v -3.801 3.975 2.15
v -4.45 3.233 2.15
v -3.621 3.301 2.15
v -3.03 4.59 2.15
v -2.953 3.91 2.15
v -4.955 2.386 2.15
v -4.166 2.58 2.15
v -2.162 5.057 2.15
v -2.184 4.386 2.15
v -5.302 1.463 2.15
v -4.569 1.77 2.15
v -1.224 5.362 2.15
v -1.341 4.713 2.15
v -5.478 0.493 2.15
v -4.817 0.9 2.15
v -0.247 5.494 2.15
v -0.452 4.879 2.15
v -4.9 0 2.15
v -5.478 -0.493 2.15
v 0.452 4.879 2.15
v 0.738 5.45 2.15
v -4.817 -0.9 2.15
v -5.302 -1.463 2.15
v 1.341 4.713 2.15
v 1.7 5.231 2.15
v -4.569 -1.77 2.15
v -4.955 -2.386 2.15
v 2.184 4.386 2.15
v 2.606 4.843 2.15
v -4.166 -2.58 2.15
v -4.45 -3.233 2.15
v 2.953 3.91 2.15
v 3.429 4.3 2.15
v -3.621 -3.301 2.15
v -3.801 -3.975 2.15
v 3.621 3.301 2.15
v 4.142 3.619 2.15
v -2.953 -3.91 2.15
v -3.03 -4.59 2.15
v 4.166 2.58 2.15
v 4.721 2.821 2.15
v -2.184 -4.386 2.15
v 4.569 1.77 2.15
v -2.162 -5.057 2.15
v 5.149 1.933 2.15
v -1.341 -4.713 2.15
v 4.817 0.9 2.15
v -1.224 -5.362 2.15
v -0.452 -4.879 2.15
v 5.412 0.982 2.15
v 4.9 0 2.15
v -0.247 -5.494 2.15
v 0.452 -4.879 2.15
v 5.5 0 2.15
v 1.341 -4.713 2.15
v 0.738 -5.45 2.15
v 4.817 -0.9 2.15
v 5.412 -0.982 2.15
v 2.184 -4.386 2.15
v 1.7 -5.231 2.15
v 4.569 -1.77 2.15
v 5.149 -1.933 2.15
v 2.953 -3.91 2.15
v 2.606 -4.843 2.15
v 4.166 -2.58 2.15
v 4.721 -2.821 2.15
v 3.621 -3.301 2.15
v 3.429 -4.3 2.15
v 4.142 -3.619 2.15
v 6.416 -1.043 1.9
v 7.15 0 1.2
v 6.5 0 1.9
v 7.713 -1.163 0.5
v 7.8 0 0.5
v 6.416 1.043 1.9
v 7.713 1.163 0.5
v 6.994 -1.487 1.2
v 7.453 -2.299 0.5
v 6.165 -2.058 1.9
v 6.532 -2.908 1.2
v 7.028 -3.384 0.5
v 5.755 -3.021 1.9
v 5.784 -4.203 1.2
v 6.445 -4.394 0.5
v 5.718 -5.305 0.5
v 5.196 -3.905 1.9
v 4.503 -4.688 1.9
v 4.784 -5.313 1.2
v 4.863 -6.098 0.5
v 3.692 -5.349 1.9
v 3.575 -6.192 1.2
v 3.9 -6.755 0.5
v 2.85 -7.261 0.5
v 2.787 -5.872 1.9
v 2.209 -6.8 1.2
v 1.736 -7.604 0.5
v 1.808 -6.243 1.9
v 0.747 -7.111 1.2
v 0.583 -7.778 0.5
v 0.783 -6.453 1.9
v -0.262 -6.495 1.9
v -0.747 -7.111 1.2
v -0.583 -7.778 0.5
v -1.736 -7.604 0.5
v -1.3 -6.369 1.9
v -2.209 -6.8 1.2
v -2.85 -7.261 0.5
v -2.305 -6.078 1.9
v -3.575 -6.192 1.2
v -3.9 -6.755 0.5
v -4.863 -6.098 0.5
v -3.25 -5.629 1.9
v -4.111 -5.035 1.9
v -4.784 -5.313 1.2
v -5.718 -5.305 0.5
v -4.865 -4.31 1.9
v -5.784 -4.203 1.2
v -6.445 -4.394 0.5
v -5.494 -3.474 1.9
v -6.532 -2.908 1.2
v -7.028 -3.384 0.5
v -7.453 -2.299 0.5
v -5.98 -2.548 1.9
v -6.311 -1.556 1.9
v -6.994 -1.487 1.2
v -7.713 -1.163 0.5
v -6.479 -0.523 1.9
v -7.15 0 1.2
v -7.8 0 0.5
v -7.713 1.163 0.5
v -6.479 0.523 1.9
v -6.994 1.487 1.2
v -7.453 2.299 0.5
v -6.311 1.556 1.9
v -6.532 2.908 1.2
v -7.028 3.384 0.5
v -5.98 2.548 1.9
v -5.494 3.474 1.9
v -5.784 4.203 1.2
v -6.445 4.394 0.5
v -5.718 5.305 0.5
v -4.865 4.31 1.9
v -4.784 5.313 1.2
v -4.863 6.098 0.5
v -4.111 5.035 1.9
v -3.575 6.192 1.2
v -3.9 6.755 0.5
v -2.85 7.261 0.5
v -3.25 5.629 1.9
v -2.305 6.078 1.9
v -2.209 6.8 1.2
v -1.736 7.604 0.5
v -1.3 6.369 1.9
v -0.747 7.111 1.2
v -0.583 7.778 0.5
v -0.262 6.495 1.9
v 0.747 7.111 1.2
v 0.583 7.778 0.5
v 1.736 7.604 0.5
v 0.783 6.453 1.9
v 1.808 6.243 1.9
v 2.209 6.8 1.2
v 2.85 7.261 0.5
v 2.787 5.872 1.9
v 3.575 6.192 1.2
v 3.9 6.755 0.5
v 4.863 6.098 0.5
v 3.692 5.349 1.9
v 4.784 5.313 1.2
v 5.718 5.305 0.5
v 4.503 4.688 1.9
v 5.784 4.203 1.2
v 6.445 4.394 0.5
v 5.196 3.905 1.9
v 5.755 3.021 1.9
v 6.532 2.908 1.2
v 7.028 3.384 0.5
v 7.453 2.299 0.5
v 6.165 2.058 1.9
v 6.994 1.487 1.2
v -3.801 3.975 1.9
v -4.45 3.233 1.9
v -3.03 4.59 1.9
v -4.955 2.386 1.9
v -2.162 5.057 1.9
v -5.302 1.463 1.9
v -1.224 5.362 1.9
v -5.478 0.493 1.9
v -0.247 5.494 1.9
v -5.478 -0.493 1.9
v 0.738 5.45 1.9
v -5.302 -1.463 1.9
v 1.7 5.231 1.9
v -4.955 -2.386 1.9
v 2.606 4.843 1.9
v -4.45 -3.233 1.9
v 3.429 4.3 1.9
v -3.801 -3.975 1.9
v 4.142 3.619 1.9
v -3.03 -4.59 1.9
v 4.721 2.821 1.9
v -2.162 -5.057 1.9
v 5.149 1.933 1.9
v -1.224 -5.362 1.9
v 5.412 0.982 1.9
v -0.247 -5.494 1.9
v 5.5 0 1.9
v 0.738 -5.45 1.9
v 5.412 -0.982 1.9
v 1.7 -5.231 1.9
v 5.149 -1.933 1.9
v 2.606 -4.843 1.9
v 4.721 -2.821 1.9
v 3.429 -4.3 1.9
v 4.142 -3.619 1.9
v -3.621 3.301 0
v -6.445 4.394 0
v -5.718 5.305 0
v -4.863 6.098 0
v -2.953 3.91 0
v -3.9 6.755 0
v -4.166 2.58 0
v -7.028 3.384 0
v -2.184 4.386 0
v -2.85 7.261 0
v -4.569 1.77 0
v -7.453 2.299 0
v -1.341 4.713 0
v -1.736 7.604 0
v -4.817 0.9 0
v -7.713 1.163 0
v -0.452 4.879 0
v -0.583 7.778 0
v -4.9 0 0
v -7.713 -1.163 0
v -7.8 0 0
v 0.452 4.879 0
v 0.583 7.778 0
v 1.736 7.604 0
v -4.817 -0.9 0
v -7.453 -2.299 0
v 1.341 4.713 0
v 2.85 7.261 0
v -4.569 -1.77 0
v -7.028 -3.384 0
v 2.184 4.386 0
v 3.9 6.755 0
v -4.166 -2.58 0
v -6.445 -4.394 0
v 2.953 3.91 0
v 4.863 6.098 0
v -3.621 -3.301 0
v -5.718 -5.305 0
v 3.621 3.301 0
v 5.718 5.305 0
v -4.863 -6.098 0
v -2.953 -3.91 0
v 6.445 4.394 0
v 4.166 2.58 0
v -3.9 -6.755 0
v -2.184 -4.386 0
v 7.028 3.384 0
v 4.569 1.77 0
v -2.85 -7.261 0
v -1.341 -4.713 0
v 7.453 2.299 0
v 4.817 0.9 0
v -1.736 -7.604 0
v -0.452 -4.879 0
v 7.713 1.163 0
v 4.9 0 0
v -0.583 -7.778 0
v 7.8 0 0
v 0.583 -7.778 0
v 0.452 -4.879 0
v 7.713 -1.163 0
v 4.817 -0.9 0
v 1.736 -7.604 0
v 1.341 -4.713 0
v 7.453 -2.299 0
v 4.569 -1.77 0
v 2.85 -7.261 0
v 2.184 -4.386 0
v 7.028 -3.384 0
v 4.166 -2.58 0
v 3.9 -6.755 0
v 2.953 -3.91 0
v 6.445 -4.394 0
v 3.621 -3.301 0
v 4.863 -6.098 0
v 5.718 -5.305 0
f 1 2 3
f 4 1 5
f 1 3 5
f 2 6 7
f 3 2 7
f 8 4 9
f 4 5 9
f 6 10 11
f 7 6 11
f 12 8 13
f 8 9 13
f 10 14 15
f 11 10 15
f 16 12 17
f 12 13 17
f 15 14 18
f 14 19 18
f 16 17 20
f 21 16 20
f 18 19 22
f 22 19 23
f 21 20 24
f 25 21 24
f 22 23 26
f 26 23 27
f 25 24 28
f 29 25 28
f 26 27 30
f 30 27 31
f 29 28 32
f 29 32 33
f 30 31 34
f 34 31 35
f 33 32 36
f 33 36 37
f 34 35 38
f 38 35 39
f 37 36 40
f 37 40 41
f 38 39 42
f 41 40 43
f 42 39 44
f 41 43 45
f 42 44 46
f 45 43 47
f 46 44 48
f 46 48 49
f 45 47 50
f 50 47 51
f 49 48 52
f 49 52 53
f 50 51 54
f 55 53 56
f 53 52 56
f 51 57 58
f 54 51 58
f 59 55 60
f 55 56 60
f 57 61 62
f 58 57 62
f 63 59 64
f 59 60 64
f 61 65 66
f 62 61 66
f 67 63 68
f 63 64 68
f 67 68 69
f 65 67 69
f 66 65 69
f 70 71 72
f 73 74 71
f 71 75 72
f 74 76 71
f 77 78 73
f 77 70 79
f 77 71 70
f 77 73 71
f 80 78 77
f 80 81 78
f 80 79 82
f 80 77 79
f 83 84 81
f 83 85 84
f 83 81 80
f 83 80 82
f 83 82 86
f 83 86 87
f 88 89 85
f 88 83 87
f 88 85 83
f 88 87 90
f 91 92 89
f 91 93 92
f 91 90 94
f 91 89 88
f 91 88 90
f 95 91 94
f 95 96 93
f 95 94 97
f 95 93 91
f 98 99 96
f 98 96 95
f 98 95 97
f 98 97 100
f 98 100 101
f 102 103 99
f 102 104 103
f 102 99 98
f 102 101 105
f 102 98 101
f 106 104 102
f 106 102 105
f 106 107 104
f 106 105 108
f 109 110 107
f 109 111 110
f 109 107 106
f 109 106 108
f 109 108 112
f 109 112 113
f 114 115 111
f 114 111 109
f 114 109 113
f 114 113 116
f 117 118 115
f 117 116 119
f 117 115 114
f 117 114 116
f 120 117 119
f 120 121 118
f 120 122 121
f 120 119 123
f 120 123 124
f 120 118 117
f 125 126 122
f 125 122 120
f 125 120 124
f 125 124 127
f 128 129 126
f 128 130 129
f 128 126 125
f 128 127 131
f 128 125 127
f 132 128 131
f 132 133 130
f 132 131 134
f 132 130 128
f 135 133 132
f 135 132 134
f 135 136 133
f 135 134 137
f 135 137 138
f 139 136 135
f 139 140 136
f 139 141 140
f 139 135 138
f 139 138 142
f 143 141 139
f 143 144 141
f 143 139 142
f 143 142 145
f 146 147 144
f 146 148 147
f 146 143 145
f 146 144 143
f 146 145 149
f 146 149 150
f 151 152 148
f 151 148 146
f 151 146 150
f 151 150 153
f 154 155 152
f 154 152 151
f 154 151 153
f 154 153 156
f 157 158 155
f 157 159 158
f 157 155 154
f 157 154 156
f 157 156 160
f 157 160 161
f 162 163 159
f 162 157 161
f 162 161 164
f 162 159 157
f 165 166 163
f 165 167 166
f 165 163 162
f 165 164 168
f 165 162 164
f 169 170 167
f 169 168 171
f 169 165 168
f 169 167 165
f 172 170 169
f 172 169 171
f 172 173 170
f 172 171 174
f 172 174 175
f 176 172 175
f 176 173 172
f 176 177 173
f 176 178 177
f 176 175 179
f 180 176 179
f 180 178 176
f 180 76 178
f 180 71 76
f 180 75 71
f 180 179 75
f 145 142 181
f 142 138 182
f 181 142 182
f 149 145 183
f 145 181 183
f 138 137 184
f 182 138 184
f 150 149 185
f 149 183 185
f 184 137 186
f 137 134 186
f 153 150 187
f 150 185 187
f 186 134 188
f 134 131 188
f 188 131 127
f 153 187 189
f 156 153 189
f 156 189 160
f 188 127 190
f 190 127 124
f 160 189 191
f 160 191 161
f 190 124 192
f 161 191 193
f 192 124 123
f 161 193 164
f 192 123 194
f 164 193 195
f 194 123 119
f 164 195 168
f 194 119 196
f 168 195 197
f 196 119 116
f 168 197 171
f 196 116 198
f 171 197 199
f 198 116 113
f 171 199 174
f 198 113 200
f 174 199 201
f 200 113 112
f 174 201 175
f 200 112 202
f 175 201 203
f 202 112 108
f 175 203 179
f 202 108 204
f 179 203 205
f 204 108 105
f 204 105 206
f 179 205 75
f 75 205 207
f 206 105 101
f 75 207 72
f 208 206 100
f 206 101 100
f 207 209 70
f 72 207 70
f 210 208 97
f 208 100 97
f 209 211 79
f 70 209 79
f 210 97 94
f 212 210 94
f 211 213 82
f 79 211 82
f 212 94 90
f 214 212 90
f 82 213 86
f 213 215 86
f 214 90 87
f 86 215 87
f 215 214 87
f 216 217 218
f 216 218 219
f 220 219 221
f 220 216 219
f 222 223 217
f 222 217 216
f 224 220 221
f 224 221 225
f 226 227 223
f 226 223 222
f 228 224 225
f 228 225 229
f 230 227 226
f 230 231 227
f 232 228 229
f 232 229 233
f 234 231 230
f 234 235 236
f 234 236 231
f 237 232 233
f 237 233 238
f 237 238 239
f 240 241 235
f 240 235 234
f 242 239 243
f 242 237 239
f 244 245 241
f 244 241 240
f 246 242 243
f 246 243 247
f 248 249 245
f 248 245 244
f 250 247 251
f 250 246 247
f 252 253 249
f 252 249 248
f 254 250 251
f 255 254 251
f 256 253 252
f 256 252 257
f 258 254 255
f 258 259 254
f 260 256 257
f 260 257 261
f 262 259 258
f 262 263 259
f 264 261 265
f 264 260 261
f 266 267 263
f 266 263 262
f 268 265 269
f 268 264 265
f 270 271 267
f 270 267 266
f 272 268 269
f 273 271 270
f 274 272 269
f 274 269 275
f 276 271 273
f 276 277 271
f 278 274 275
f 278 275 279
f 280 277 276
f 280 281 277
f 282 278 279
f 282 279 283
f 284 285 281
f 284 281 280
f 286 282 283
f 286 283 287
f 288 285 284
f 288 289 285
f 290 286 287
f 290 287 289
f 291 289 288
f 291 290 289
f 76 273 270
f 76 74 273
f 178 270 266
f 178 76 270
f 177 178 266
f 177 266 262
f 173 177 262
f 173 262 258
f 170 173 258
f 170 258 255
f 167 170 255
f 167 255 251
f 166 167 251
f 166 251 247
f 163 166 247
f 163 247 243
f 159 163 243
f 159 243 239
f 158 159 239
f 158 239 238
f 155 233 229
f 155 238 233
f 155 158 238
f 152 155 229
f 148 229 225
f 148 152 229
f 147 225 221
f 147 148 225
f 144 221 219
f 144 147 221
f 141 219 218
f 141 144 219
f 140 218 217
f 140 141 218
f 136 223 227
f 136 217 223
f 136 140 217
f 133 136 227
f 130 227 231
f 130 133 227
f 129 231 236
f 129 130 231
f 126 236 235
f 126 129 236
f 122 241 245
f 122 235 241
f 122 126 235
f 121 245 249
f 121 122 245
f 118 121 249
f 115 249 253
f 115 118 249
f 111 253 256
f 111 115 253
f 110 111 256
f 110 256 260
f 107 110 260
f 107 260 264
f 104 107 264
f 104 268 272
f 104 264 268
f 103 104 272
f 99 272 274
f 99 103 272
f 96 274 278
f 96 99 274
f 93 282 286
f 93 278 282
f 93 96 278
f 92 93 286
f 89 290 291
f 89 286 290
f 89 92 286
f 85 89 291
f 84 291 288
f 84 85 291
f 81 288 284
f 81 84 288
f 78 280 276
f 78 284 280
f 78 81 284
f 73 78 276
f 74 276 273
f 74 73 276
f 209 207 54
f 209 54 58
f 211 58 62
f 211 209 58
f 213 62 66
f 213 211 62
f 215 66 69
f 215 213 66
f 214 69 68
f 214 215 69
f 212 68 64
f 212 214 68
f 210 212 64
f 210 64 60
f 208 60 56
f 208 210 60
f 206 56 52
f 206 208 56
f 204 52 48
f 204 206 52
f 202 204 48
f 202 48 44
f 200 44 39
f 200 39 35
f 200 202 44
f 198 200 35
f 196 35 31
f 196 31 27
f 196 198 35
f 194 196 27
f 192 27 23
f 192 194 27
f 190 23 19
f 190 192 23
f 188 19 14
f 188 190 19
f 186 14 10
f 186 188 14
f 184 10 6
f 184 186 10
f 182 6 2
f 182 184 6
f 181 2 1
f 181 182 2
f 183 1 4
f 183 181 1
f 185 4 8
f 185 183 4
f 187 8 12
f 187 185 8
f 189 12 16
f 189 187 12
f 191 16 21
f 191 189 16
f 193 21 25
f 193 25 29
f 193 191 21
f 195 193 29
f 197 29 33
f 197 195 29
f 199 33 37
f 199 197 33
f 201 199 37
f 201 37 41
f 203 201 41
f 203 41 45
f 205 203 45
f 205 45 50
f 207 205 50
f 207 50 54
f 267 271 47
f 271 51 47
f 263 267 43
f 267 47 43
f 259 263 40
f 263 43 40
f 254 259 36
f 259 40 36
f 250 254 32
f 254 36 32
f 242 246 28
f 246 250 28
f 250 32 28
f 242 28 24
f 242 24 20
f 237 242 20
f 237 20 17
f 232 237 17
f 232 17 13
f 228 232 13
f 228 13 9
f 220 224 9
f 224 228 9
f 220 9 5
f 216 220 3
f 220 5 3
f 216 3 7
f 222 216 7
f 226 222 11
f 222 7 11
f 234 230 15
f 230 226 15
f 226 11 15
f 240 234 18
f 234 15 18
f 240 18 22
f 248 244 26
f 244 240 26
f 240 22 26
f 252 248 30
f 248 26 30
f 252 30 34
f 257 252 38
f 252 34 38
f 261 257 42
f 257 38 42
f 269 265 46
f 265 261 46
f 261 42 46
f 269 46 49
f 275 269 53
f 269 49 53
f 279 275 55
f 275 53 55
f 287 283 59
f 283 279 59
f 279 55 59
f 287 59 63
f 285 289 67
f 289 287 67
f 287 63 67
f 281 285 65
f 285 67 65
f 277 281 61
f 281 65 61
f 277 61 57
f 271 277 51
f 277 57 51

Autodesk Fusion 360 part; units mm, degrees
sketch "Sketch2" plane through (0, 0, 0) normal (0, 1, 0) x (1, 0, 0)
  line L0 (0, -5.5) -> (0, 3.2)
  line L1 (0, 0) -> (4.9, 0) construction
  line L2 (4.9, 0) -> (4.9, -2.15)
  line L3 (4.9, 0) -> (7.8, 0)
  line L4 (7.8, 0) -> (7.8, -0.5)
  line L5 (4.9, -2.15) -> (5.5, -2.15)
  line L6 (5.5, -2.15) -> (5.5, -1.9)
  line L7 (5.5, -1.9) -> (6.5, -1.9)
  line L8 (6.5, -1.9) -> (7.8, -0.5)
  dimension "d3" = 4.9
  dimension "d4" = 2.15
  dimension "d5" = 2.9
  dimension "d6" = 0.5
  dimension "d7" = 0.6
  dimension "d8" = 1.9
  dimension "d9" = 1.6
revolve "Revolve1" add sketch "Sketch2" angle 360 about axis through (0, 0, 5.5) along (0, 0, -1)
equation "d3 = ( 9.8 / 2 ) * 1 mm"
equation "d5 = ( 15.6 / 2 ) * 1 mm - 4.9 mm"
